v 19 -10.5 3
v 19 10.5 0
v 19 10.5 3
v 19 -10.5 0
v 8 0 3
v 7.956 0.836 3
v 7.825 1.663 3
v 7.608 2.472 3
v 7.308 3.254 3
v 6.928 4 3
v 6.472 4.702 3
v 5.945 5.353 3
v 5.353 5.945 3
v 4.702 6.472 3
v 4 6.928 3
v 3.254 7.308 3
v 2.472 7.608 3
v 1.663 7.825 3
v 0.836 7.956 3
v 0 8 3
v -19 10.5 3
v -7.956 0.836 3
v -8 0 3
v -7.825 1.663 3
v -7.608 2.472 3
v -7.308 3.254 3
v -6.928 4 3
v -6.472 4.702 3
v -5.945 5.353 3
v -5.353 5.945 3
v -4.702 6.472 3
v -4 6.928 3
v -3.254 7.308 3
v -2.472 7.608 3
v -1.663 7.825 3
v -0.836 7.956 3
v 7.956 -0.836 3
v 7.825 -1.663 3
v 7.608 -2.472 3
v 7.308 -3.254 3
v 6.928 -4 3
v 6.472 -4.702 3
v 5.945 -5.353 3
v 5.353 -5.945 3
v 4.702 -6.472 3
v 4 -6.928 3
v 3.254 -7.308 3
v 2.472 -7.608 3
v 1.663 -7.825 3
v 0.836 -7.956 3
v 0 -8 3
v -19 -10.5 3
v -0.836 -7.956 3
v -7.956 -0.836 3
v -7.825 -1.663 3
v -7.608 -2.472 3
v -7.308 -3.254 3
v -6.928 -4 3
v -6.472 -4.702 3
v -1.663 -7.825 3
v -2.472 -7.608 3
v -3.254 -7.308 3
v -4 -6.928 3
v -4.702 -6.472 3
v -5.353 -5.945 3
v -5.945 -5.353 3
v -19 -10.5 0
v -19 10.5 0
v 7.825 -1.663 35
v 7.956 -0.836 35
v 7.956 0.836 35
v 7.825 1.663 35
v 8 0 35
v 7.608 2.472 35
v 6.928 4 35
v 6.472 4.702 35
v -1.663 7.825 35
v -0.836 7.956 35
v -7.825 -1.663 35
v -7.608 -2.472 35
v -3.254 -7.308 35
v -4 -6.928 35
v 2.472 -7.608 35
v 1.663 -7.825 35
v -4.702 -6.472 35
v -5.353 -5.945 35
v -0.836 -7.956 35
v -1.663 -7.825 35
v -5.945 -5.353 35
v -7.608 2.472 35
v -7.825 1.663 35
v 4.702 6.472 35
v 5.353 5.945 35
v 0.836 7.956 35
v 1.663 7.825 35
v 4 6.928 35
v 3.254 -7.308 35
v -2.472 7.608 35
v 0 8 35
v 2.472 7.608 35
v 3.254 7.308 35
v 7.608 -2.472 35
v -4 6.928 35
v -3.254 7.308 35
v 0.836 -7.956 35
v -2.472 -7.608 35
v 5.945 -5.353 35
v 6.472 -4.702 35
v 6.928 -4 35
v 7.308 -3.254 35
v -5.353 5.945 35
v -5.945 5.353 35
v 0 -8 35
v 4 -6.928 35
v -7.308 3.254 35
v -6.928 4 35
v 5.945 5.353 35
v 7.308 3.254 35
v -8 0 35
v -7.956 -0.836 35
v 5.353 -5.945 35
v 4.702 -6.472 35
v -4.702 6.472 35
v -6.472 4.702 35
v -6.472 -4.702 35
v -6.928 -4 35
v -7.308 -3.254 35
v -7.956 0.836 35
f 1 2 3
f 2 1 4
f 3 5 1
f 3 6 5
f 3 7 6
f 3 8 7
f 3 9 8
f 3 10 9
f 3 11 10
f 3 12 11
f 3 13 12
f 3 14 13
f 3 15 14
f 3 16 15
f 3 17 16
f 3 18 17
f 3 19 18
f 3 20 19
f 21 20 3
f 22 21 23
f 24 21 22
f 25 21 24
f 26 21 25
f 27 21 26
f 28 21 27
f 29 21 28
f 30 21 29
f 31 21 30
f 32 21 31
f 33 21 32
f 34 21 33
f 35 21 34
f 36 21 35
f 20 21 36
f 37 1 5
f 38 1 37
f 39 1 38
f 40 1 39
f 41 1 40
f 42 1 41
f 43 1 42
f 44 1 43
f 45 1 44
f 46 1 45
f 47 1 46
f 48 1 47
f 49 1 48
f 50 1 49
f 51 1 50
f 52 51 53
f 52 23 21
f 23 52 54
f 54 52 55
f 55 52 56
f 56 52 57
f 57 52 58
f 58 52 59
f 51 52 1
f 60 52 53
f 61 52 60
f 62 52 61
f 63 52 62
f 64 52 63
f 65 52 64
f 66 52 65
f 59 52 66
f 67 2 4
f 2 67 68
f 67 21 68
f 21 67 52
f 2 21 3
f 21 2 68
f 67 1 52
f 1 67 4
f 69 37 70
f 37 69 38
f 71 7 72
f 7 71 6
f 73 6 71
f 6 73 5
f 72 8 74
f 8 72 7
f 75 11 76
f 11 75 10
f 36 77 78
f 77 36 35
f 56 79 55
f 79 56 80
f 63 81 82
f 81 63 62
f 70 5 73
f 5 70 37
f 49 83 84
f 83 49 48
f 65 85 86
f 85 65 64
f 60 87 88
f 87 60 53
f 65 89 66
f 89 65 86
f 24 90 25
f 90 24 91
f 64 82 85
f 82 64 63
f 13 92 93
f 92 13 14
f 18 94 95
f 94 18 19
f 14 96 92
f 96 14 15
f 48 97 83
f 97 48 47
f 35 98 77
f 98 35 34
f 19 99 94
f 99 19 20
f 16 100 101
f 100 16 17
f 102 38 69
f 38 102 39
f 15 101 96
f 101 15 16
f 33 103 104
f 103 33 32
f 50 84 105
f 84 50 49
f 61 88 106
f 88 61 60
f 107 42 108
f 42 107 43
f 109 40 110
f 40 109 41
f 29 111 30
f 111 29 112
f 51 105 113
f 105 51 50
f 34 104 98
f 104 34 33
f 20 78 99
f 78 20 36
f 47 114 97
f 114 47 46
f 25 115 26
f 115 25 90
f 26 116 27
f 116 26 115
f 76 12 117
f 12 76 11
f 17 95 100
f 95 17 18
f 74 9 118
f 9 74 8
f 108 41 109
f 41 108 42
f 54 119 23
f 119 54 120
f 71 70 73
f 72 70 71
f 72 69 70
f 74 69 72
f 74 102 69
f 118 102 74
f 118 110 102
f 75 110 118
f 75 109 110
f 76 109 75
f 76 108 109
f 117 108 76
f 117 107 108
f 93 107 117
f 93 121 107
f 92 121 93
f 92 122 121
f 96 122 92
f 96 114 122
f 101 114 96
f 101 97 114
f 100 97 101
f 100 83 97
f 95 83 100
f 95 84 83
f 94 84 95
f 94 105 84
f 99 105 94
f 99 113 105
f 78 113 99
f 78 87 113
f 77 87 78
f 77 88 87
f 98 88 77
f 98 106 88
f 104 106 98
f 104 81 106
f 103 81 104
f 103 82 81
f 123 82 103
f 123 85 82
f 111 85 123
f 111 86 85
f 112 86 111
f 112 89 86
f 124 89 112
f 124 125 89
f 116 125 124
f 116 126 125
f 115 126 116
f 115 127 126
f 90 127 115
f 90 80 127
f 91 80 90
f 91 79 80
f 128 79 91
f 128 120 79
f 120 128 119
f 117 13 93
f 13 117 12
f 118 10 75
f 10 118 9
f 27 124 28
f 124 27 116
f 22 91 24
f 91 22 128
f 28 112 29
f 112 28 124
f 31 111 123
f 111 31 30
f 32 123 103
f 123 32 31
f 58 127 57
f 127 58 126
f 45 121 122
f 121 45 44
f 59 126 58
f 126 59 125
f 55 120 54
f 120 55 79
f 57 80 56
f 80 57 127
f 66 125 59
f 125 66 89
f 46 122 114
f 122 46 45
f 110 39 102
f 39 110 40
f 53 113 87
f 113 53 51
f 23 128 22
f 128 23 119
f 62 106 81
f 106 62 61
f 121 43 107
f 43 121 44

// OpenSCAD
// T-head slot bolt.
$fn = 60;
eps = 0.02;
shaft_d = 16;
head_l = 38;
shaft_l = 32;
head_w = shaft_d + 5;
head_h = 3;
union() {
    translate([-head_l/2,-head_w/2,0]) cube([head_l,head_w,head_h]);
    translate([0,0,head_h]) cylinder(d=shaft_d,h=shaft_l);
}
